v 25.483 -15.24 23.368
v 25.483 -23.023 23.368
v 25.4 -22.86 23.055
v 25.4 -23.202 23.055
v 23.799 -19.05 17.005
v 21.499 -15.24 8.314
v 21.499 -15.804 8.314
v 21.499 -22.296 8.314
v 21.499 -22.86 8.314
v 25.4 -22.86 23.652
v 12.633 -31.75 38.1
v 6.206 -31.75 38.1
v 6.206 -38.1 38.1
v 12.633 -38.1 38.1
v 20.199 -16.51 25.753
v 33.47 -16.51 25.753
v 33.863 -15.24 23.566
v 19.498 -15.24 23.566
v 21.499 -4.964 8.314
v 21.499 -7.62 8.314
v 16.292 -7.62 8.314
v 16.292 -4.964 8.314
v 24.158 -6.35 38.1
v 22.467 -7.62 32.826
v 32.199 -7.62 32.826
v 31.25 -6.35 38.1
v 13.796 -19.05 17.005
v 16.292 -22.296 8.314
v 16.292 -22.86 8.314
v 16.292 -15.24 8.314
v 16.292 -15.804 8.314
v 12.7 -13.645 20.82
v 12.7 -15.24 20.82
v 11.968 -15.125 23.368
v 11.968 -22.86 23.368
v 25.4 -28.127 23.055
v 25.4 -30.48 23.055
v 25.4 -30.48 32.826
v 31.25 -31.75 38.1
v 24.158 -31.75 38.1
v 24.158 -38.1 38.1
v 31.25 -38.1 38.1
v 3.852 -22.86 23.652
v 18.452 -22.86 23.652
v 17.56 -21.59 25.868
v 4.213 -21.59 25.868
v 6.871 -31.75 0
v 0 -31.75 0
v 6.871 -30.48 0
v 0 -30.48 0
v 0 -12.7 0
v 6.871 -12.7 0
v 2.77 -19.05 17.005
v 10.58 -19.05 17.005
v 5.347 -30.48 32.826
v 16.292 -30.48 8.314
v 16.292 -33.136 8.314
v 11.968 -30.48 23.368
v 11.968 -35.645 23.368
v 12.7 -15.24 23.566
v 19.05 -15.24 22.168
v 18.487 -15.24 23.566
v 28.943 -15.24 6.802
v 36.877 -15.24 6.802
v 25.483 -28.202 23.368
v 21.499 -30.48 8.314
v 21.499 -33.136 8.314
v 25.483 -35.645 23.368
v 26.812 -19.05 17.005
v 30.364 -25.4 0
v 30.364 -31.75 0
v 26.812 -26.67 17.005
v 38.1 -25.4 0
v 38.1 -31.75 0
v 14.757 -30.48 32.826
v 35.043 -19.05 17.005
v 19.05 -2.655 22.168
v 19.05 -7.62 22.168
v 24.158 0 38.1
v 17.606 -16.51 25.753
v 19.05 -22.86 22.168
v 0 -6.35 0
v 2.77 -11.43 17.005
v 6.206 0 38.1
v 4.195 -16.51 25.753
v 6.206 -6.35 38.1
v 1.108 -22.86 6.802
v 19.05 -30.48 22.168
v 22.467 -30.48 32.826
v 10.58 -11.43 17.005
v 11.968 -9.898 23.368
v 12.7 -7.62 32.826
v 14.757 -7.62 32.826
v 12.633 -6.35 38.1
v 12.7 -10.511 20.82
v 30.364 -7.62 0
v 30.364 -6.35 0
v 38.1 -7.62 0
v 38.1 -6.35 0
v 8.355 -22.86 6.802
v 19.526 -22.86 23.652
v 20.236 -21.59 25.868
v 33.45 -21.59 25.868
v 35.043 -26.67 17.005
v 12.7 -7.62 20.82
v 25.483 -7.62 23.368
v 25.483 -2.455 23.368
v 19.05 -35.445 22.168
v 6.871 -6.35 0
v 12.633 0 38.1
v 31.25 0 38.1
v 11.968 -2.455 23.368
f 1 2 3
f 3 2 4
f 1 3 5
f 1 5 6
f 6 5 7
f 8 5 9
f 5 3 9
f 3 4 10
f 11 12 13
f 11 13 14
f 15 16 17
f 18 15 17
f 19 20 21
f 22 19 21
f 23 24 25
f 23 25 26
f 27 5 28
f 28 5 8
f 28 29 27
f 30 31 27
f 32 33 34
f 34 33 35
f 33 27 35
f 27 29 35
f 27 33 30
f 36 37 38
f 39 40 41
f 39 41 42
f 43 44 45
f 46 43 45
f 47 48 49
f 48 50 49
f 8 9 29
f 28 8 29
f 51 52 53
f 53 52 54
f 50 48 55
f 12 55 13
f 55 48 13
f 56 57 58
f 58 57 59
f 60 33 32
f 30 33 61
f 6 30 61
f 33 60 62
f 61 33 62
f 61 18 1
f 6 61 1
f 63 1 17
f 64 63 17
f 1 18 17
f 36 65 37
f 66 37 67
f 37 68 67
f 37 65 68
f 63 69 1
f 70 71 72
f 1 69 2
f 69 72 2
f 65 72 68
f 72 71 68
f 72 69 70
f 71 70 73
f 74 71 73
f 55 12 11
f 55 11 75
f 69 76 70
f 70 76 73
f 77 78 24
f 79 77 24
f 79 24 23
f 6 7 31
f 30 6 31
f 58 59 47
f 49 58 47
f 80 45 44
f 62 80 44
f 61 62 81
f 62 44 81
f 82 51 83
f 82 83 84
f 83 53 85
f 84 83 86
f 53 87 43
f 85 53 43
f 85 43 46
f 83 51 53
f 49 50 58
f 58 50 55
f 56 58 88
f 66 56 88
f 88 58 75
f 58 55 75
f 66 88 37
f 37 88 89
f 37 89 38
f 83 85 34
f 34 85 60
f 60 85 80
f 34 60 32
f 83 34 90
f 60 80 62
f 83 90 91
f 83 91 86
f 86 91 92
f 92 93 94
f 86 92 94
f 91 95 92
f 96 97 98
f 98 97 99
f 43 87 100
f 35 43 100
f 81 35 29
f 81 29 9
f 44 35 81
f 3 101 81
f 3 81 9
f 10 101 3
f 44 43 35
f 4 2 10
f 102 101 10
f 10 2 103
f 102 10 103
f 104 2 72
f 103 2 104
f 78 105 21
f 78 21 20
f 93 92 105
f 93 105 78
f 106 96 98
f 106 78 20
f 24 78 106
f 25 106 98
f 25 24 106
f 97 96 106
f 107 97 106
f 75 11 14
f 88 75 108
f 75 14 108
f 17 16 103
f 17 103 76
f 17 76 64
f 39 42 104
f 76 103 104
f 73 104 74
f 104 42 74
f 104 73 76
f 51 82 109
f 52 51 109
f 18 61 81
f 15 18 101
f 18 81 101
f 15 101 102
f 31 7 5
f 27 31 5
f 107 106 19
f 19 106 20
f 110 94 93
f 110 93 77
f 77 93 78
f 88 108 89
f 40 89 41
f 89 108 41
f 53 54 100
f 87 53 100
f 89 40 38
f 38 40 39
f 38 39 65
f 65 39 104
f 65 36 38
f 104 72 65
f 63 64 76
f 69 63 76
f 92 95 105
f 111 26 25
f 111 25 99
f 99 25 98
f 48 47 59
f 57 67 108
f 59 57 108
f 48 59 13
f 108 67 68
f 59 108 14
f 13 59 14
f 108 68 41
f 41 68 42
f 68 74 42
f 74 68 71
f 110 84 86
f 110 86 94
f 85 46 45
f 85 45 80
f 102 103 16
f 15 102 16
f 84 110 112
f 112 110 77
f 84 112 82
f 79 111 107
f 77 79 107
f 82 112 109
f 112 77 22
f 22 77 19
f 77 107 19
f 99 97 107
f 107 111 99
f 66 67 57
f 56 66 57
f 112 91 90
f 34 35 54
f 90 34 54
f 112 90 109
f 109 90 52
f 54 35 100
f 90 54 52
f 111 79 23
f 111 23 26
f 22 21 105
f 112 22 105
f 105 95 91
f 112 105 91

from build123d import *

# Parameters (mm, degrees)
F0_W      = 38.1
F0_H      = 38.1
F1_DEPTH  = 38.1
F6_DEPTH  = 38.1
F8_DEPTH  = 38.1
F9_W      = 25.4
F9_H      = 7.62
F10_DEPTH = 38.1


with BuildPart() as f1:
    # F0 (on Front) → F1 (new body)
    with BuildSketch(Plane.XZ):
        with Locations((19.05, 19.05)):
            Rectangle(F0_W, F0_H)
    extrude(amount=F1_DEPTH)

    # F4 (on face) → F6 (cut)
    with BuildSketch(Plane.YZ.offset(38.1)):
        Polygon((-6.35, 38.1), (-31.75, 38.1), (-26.67, 17.005277), (-21.59, 25.867645), (-16.51, 25.753345), (-11.43, 17.005277), align=None)
        Polygon((-31.75, 0), (-38.1, 38.1), (-38.1, 0), align=None)
        Polygon((0, 0), (0, 38.1), (-6.35, 0), align=None)
        Polygon((-19.05, 17.005277), (-25.4, 0), (-12.7, 0), align=None)
    extrude(amount=-F6_DEPTH, mode=Mode.SUBTRACT)

    # F7 (on offset) → F8 (cut)
    with BuildSketch(Plane.XZ.offset(38.1)):
        Polygon((0, 38.1), (0, 0), (6.205763, 38.1), align=None)
        Polygon((11.968254, 23.367919), (6.870665, 0), (30.363908, 0), (25.482736, 23.367919), (21.498529, 8.313587), (16.292483, 8.313587), align=None)
        Polygon((31.250443, 38.1), (38.1, 0), (38.1, 38.1), align=None)
        Polygon((24.158144, 38.1), (12.633159, 38.1), (19.05, 22.168303), align=None)
    extrude(amount=-F8_DEPTH, mode=Mode.SUBTRACT)

    # F9 (on offset) → F10 (cut)
    with BuildSketch(Plane.XY.offset(38.1)):
        with Locations((25.4, -11.43)):
            Rectangle(F9_W, F9_H)
        with Locations((12.7, -26.67)):
            Rectangle(F9_W, F9_H)
    extrude(amount=-F10_DEPTH, mode=Mode.SUBTRACT)


solid = f1.part
